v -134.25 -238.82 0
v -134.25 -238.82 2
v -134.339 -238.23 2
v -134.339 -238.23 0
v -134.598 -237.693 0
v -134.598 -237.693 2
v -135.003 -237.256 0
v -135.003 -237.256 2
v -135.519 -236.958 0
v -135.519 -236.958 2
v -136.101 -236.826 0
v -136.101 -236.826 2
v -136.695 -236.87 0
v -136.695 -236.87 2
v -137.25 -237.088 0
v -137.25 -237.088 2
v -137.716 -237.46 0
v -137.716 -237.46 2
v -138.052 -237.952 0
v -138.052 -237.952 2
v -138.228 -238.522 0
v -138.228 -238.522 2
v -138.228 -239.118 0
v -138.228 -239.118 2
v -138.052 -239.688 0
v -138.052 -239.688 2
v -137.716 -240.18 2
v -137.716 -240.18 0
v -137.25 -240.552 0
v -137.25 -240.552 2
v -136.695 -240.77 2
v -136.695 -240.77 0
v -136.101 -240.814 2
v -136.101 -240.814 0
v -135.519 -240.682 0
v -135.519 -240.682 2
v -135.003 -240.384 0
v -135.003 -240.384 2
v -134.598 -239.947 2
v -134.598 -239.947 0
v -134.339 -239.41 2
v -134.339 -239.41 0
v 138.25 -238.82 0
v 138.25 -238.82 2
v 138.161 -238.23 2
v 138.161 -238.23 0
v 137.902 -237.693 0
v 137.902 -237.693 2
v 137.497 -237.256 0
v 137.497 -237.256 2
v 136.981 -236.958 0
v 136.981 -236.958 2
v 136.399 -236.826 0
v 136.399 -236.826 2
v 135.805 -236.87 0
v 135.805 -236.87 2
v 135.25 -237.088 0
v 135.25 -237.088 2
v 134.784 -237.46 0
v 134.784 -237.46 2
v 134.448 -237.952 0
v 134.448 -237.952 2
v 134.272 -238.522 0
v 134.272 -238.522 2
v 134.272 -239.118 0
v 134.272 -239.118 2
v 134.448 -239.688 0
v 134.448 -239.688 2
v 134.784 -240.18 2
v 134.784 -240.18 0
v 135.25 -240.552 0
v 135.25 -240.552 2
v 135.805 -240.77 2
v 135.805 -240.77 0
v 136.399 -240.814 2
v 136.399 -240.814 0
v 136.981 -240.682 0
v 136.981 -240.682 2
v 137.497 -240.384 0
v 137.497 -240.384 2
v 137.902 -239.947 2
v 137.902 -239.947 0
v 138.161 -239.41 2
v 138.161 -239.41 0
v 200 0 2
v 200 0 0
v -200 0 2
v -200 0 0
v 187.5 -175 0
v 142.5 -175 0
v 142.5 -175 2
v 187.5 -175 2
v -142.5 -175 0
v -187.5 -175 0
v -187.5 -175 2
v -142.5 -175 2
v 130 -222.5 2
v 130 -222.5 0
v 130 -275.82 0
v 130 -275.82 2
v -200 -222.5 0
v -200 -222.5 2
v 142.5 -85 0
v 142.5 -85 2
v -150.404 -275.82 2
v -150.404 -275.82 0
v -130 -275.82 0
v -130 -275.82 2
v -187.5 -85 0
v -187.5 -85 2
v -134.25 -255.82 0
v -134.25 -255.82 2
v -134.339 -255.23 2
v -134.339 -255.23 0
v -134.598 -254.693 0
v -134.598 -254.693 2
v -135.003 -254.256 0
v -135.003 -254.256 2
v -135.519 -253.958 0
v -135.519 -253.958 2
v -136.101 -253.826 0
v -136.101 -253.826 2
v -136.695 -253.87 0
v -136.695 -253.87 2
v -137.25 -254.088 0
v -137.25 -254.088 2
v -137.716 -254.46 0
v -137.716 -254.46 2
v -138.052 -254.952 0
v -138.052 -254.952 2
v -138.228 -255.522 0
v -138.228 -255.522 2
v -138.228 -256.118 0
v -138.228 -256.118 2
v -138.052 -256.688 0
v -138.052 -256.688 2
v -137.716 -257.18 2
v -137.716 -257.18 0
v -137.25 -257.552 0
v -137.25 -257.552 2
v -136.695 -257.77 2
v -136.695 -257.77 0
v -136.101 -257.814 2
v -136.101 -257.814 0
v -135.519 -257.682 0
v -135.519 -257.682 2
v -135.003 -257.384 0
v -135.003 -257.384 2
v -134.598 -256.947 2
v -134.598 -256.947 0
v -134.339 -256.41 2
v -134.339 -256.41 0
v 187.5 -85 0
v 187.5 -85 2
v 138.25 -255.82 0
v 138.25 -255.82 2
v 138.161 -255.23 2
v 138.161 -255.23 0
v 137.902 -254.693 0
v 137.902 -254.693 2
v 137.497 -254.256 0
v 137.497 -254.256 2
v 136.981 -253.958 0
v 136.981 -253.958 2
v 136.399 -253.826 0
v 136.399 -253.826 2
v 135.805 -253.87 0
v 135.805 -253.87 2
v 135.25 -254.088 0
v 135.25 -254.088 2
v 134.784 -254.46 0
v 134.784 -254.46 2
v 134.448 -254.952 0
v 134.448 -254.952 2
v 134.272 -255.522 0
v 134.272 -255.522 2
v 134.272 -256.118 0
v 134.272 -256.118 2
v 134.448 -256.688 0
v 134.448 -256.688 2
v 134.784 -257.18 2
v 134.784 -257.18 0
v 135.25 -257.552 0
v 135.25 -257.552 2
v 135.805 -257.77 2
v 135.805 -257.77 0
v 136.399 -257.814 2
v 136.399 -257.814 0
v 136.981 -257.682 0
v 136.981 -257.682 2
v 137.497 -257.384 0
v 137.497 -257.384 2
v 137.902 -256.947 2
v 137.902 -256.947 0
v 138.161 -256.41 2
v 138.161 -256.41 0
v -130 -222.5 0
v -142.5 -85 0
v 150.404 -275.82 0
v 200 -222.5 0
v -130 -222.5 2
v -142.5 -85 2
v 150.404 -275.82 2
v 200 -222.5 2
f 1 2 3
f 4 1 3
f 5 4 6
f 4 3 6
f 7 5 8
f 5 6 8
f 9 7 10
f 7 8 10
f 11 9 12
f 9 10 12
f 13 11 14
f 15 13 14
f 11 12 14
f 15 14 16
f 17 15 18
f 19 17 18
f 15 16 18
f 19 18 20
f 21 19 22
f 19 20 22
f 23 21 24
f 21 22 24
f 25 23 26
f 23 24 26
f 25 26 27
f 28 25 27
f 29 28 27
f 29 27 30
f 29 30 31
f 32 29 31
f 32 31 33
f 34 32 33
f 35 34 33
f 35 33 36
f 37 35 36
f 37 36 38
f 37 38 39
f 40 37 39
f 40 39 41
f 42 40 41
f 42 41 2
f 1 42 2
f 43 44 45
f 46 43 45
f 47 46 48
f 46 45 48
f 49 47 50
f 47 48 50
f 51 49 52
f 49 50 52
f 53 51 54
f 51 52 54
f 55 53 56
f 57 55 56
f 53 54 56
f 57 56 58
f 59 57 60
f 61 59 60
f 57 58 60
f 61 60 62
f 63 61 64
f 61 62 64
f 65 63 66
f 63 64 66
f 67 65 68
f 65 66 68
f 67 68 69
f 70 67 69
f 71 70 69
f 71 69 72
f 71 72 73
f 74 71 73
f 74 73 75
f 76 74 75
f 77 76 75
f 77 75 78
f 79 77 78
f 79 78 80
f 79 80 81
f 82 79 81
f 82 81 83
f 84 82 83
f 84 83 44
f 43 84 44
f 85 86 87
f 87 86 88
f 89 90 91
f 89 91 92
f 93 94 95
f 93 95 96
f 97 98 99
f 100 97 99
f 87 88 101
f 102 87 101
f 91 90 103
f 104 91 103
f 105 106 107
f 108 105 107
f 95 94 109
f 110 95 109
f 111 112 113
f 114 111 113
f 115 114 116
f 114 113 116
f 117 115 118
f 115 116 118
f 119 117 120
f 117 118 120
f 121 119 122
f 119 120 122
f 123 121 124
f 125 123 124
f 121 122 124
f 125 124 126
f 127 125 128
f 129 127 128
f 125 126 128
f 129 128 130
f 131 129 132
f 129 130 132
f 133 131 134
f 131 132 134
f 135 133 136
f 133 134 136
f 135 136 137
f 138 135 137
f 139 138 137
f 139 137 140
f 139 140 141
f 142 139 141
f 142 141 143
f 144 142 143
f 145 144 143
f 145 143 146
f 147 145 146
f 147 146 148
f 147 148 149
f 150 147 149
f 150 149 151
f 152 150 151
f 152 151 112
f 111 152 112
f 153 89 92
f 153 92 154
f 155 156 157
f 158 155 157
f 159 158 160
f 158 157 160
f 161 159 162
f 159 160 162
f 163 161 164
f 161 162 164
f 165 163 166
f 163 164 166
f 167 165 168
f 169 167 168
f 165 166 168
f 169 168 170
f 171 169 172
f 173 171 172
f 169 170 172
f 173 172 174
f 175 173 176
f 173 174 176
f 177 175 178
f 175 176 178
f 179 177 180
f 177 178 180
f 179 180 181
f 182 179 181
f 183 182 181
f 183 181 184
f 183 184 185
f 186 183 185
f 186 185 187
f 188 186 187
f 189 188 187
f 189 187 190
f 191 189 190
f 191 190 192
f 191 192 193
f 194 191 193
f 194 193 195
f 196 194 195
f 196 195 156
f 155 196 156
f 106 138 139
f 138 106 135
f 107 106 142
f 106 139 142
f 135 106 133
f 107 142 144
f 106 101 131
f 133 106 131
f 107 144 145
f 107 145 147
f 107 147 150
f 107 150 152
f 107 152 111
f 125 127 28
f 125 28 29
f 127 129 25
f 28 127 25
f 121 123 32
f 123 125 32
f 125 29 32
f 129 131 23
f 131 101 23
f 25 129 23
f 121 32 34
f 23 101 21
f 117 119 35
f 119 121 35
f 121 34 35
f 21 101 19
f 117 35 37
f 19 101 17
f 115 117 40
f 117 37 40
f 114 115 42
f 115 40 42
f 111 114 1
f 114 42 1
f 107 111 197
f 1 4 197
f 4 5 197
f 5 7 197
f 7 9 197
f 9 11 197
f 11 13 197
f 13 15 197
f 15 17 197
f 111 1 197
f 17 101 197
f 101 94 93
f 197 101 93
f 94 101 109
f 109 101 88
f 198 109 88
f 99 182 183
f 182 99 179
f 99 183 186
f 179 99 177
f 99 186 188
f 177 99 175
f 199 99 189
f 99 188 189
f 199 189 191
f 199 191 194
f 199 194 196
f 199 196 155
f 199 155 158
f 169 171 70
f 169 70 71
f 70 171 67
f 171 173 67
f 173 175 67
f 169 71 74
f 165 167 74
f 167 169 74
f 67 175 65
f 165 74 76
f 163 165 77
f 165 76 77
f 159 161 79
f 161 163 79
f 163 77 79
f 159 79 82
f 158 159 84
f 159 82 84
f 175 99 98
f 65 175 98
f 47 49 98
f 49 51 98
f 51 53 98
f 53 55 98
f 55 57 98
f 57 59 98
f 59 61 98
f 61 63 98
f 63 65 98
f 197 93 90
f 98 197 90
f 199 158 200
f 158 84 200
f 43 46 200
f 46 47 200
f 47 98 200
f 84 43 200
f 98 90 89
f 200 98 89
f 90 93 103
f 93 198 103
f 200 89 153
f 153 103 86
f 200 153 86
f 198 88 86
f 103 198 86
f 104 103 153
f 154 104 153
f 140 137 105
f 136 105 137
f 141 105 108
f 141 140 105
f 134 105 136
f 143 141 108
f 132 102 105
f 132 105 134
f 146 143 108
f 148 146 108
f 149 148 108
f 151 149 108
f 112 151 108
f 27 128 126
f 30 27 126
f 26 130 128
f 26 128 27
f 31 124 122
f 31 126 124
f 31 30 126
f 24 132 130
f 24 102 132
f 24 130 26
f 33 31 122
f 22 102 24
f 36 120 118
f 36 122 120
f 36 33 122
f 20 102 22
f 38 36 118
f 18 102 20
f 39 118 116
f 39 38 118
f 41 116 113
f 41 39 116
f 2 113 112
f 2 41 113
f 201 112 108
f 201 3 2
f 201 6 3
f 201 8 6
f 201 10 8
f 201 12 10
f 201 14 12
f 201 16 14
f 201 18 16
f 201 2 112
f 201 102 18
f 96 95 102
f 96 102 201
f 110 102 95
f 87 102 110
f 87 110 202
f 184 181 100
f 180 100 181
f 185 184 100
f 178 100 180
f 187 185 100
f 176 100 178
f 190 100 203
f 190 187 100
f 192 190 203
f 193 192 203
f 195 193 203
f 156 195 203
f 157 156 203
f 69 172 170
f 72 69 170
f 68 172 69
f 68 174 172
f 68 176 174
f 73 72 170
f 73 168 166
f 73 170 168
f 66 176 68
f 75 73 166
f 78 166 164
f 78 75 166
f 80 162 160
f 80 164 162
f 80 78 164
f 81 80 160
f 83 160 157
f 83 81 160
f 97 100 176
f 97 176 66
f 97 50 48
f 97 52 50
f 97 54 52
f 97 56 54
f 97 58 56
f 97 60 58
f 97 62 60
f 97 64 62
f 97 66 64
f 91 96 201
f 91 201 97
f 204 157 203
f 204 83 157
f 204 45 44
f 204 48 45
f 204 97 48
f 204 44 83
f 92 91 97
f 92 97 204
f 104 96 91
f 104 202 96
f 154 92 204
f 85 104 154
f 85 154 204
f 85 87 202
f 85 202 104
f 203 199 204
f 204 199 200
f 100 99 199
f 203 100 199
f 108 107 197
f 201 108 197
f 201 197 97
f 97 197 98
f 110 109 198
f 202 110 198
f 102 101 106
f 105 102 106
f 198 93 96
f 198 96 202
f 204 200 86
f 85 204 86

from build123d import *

# Parameters (mm, degrees)
SKETCH1_W           = 45
SKETCH1_H           = 90
BOSS_EXTRUDE1_DEPTH = 2
SKETCH2_R           = 2
CUT_EXTRUDE1_DEPTH  = 10


with BuildPart() as part:
    # Sketch1 → Boss-Extrude1 (new body)
    with BuildSketch(Plane.XY):
        Polygon((200, 0), (-200, 0), (-200, -222.5), (-150.404334867, -275.82), (-130, -275.82), (-130, -222.5), (130, -222.5), (130, -275.82), (150.404334867, -275.82), (200, -222.5), align=None)
        with Locations((-165, -130)):
            Rectangle(SKETCH1_W, SKETCH1_H, mode=Mode.SUBTRACT)
        with Locations((165, -130)):
            Rectangle(SKETCH1_W, SKETCH1_H, mode=Mode.SUBTRACT)
    extrude(amount=BOSS_EXTRUDE1_DEPTH)

    # Sketch2 → Cut-Extrude1 (cut)
    with BuildSketch(Plane.XY.offset(2)):
        with Locations((-136.25, -238.82)):
            Circle(SKETCH2_R)
        with Locations((-136.25, -255.82)):
            Circle(SKETCH2_R)
        with Locations((136.25, -255.82)):
            Circle(SKETCH2_R)
        with Locations((136.25, -238.82)):
            Circle(SKETCH2_R)
    extrude(amount=-CUT_EXTRUDE1_DEPTH, mode=Mode.SUBTRACT)


solid = part.part
